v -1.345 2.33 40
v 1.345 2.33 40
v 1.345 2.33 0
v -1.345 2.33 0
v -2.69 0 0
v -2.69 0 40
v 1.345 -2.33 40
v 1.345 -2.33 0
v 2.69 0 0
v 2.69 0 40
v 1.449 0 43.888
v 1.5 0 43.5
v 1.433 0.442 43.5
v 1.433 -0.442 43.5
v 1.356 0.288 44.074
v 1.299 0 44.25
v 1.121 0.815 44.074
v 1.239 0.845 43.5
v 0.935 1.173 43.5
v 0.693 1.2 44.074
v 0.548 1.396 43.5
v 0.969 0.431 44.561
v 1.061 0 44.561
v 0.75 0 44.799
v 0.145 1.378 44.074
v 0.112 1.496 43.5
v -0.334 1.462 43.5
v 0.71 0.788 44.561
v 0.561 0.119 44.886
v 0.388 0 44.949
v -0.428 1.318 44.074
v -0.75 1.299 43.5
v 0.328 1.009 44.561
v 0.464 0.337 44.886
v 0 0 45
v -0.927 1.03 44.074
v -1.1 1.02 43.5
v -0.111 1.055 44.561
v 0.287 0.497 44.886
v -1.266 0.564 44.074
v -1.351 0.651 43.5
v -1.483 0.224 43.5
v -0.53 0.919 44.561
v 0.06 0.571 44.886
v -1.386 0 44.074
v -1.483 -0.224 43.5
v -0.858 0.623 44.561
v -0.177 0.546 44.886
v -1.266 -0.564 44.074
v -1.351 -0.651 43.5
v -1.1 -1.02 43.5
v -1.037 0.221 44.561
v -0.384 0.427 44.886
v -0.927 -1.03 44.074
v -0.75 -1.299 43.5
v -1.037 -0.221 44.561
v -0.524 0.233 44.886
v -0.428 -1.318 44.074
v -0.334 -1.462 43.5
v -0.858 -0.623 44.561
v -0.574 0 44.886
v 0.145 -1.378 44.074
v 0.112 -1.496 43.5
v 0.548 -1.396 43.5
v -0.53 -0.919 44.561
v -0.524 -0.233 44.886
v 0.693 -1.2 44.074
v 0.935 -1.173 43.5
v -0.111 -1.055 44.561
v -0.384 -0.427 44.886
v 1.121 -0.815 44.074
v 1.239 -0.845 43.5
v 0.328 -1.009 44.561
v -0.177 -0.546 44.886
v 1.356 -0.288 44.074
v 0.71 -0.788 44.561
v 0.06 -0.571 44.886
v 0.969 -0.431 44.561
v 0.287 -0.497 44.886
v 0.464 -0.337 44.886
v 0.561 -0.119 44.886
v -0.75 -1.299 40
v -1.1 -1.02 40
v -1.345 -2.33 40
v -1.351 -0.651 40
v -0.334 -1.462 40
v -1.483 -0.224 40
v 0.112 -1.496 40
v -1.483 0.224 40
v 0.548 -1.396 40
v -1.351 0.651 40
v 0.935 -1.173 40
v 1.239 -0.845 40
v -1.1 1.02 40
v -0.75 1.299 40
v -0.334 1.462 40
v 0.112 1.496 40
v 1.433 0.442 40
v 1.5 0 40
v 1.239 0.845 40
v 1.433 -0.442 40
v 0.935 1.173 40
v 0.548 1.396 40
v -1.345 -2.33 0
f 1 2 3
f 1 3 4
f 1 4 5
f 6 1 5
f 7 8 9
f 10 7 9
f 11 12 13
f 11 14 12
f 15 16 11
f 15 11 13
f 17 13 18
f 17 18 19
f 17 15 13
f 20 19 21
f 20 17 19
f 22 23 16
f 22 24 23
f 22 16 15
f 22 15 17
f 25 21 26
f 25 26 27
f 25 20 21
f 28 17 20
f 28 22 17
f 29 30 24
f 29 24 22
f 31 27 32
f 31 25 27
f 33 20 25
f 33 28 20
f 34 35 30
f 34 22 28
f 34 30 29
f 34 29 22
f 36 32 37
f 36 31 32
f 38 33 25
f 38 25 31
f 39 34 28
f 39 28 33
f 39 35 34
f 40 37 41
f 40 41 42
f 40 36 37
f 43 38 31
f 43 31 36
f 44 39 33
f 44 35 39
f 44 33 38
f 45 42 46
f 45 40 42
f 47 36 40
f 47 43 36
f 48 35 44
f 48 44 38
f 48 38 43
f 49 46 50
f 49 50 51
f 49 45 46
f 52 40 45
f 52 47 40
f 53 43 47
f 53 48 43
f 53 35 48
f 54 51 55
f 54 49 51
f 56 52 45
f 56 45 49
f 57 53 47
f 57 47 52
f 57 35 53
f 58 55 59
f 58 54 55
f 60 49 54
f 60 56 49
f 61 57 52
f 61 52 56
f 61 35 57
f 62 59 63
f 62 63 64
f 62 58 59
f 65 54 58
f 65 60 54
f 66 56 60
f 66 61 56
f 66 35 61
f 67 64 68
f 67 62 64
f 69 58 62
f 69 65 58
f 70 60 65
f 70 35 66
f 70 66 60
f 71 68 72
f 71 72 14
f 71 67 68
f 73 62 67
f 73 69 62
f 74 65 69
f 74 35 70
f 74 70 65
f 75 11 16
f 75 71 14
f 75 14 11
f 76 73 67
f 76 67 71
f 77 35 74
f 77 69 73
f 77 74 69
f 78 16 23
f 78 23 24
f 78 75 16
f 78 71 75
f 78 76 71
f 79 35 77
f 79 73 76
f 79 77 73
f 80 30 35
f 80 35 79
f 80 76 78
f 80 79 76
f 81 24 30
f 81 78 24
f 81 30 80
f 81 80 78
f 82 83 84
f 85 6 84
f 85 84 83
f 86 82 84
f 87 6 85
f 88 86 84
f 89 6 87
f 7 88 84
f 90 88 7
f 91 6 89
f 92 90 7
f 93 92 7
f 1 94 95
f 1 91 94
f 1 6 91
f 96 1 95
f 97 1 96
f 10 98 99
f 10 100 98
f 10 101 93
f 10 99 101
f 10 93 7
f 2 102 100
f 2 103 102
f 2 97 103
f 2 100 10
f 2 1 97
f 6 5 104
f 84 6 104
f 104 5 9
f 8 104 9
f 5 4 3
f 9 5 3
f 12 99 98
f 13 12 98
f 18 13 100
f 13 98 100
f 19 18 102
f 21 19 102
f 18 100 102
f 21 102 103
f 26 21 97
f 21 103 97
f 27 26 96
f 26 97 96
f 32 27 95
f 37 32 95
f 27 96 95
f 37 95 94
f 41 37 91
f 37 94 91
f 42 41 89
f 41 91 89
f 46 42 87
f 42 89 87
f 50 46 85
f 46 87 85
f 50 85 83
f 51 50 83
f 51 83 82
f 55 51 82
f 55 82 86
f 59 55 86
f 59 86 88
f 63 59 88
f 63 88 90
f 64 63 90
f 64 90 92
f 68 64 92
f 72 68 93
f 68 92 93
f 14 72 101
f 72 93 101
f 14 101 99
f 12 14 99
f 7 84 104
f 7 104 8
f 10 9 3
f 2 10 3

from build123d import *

# Parameters (mm, degrees)
EXTRUDE_1_DEPTH = 40
SKETCH_2_R      = 1.5
EXTRUDE_2_DEPTH = 5
FILLET_1_R      = 1.5


with BuildPart() as part:
    # 草图1 → 凸台-拉伸1 (new body)
    with BuildSketch(Plane.XY):
        Polygon((2.690452254, 0), (1.345226127, 2.33), (-1.345226127, 2.33), (-2.690452254, 0), (-1.345226127, -2.33), (1.345226127, -2.33), align=None)
    extrude(amount=EXTRUDE_1_DEPTH)

    # 草图2 → 凸台-拉伸2 (add)
    with BuildSketch(Plane.XY.offset(40)):
        Circle(SKETCH_2_R)
    extrude(amount=EXTRUDE_2_DEPTH)

    # 圆角1
    fillet_1_edges = [part.edges().sort_by_distance(p)[0] for p in [
        (-1.5, 0, 45),
    ]]
    fillet(fillet_1_edges, radius=FILLET_1_R)


solid = part.part
